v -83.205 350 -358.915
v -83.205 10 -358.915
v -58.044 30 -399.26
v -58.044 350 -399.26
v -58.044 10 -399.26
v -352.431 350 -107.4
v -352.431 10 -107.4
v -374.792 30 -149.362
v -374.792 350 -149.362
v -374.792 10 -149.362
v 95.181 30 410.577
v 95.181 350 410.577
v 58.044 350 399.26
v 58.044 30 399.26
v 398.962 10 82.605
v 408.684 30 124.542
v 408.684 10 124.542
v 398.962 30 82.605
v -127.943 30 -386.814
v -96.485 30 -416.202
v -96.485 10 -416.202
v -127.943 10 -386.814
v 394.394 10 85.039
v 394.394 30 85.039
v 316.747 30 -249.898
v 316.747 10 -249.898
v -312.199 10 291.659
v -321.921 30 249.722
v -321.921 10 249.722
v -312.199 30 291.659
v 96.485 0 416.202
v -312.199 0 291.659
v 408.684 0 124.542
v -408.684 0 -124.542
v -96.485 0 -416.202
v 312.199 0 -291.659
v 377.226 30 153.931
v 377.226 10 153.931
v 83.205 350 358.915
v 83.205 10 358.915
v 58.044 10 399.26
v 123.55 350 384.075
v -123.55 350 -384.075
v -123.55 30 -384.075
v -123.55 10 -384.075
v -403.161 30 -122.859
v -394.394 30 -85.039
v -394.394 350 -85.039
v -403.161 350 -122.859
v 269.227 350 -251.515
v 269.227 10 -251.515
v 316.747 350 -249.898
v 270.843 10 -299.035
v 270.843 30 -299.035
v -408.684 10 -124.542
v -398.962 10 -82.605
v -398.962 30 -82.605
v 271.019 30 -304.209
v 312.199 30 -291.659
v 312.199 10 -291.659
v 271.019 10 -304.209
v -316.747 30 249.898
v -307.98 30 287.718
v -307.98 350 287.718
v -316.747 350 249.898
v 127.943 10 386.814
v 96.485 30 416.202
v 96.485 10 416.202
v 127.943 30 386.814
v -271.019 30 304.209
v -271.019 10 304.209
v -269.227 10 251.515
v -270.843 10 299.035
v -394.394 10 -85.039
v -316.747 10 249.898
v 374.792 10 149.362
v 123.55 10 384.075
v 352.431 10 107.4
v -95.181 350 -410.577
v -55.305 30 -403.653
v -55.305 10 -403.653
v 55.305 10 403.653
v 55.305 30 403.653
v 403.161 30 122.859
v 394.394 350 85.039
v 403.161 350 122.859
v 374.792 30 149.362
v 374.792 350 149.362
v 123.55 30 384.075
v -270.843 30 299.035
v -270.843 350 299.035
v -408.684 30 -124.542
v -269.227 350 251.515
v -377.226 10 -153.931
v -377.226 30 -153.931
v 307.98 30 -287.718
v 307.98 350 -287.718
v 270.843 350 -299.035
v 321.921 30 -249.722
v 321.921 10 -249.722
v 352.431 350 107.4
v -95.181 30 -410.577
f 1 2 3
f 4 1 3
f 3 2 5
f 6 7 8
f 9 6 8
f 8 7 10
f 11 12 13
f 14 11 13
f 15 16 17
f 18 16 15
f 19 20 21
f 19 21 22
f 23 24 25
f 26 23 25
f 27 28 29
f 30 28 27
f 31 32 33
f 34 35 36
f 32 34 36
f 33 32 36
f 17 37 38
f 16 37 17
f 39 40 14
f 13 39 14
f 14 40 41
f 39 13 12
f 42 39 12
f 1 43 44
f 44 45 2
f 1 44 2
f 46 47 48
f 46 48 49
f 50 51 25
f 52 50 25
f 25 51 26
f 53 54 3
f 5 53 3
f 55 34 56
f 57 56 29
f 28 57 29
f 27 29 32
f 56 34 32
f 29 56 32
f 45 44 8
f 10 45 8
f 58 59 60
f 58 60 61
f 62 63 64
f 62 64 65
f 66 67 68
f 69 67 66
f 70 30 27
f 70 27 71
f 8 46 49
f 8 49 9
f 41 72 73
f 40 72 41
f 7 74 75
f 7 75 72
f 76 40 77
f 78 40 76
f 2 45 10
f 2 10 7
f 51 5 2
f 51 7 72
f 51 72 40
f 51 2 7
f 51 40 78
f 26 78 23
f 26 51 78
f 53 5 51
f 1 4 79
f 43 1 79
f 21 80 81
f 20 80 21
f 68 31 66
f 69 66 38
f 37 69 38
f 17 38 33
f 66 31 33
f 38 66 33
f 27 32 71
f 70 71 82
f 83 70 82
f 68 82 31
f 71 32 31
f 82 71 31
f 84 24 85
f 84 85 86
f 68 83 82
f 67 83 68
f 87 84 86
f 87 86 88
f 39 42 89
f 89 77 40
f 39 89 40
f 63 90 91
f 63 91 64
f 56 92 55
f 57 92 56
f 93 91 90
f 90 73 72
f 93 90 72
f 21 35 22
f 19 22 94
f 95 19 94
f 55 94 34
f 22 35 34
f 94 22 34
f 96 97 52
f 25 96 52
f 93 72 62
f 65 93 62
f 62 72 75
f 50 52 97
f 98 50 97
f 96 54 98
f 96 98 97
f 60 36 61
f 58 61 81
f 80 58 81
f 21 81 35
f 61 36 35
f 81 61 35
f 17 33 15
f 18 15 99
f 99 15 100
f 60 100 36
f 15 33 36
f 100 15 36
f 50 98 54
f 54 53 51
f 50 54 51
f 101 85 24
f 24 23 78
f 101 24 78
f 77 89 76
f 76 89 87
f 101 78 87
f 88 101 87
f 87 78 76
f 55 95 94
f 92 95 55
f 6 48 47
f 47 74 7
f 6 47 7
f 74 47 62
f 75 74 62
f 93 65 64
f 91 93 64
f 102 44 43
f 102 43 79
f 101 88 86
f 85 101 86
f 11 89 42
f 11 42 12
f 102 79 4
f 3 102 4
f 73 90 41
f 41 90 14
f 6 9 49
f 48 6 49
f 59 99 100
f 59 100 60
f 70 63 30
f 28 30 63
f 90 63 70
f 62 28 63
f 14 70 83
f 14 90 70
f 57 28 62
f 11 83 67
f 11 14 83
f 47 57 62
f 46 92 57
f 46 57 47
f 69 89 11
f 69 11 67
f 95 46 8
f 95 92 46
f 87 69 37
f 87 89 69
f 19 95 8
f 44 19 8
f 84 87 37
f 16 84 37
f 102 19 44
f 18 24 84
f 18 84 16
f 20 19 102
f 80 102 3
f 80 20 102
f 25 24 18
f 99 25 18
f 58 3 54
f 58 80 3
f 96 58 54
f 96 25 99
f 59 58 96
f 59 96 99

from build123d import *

# Parameters (mm, degrees)
BOSS_EXTRU_1_DEPTH            = 30
ENL_V_MAT_EXTRU_1_DEPTH       = 20
BOSS_EXTRU_3_DEPTH            = 340
ENL_V_MAT_EXTRU_2_DEPTH       = 710.357976131
ENL_V_START                   = -320
ENL_V_MAT_EXTRU_5_DEPTH       = 364
R_P_TITION_CIRCULAIRE13_COUNT = 6


with BuildPart() as part:
    # Esquisse1 → Boss.-Extru.1 (new body)
    with BuildSketch(Plane(origin=(0, 0, 0), x_dir=(1, 0, 0), z_dir=(0, 1, 0))):
        Polygon((312.198829019, 291.659432373), (-96.485063179, 416.201833149), (-408.683892198, 124.542400776), (-312.198829019, -291.659432373), (96.485063179, -416.201833149), (408.683892198, -124.542400776), align=None)
    extrude(amount=BOSS_EXTRU_1_DEPTH)

    # Esquisse2 → Enlèv. mat.-Extru.1 (cut)
    with BuildSketch(Plane(origin=(0, 30, 0), x_dir=(1, 0, 0), z_dir=(0, 1, 0))):
        Polygon((403.161136898, -122.85939536), (307.979925924, 287.718088693), (-95.181210974, 410.577484053), (-403.161136898, 122.85939536), (-307.979925924, -287.718088693), (95.181210974, -410.577484053), align=None)
    extrude(amount=-ENL_V_MAT_EXTRU_1_DEPTH, mode=Mode.SUBTRACT)

    # Esquisse5 → Boss.-Extru.3 (add)
    with BuildSketch(Plane(origin=(0, 10, 0), x_dir=(1, 0, 0), z_dir=(0, 1, 0))):
        Polygon((83.204563714, -358.91453872), (43.518265641, -422.554131312), (107.157858233, -462.240429385), (146.844156306, -398.600836793), align=None)
    boss_extru_3 = extrude(amount=BOSS_EXTRU_3_DEPTH)

    # Esquisse6 → Enlèv. mat.-Extru.2 (cut, through all)
    with BuildSketch(Plane(origin=(0, 350, 0), x_dir=(1, 0, 0), z_dir=(0, 1, 0))):
        Polygon((55.305373646, -403.65272736), (96.485063179, -416.201833149), (127.942752354, -386.813728788), (146.844156306, -398.600836793), (107.157858233, -462.240429385), (43.518265641, -422.554131312), align=None)
    enl_v_mat_extru_2 = extrude(amount=-ENL_V_MAT_EXTRU_2_DEPTH, mode=Mode.SUBTRACT)

    # Esquisse7 → Enlèv. mat.-Extru.5 (cut)
    with BuildSketch(Plane(origin=(0, 350, 0), x_dir=(1, 0, 0), z_dir=(0, 1, 0)).offset(ENL_V_START)):
        Polygon((58.044458918, -399.260423737), (55.305373646, -403.65272736), (96.485063179, -416.201833149), (127.942752354, -386.813728788), (123.550448731, -384.074643516), (95.181210974, -410.577484053), align=None)
    enl_v_mat_extru_5 = extrude(amount=ENL_V_MAT_EXTRU_5_DEPTH, mode=Mode.SUBTRACT)

    # Répétition circulaire13: Boss.-Extru.3, Enlèv. mat.-Extru.2, Enlèv. mat.-Extru.5 ×6 about axis
    r_p_tition_circulaire13_axis = Axis((0, 0, 0), (0, 1, 0))
    add([boss_extru_3.rotate(r_p_tition_circulaire13_axis, i * 360 / R_P_TITION_CIRCULAIRE13_COUNT) for i in range(1, R_P_TITION_CIRCULAIRE13_COUNT)])
    add([enl_v_mat_extru_2.rotate(r_p_tition_circulaire13_axis, i * 360 / R_P_TITION_CIRCULAIRE13_COUNT) for i in range(1, R_P_TITION_CIRCULAIRE13_COUNT)], mode=Mode.SUBTRACT)
    add([enl_v_mat_extru_5.rotate(r_p_tition_circulaire13_axis, i * 360 / R_P_TITION_CIRCULAIRE13_COUNT) for i in range(1, R_P_TITION_CIRCULAIRE13_COUNT)], mode=Mode.SUBTRACT)


solid = part.part
